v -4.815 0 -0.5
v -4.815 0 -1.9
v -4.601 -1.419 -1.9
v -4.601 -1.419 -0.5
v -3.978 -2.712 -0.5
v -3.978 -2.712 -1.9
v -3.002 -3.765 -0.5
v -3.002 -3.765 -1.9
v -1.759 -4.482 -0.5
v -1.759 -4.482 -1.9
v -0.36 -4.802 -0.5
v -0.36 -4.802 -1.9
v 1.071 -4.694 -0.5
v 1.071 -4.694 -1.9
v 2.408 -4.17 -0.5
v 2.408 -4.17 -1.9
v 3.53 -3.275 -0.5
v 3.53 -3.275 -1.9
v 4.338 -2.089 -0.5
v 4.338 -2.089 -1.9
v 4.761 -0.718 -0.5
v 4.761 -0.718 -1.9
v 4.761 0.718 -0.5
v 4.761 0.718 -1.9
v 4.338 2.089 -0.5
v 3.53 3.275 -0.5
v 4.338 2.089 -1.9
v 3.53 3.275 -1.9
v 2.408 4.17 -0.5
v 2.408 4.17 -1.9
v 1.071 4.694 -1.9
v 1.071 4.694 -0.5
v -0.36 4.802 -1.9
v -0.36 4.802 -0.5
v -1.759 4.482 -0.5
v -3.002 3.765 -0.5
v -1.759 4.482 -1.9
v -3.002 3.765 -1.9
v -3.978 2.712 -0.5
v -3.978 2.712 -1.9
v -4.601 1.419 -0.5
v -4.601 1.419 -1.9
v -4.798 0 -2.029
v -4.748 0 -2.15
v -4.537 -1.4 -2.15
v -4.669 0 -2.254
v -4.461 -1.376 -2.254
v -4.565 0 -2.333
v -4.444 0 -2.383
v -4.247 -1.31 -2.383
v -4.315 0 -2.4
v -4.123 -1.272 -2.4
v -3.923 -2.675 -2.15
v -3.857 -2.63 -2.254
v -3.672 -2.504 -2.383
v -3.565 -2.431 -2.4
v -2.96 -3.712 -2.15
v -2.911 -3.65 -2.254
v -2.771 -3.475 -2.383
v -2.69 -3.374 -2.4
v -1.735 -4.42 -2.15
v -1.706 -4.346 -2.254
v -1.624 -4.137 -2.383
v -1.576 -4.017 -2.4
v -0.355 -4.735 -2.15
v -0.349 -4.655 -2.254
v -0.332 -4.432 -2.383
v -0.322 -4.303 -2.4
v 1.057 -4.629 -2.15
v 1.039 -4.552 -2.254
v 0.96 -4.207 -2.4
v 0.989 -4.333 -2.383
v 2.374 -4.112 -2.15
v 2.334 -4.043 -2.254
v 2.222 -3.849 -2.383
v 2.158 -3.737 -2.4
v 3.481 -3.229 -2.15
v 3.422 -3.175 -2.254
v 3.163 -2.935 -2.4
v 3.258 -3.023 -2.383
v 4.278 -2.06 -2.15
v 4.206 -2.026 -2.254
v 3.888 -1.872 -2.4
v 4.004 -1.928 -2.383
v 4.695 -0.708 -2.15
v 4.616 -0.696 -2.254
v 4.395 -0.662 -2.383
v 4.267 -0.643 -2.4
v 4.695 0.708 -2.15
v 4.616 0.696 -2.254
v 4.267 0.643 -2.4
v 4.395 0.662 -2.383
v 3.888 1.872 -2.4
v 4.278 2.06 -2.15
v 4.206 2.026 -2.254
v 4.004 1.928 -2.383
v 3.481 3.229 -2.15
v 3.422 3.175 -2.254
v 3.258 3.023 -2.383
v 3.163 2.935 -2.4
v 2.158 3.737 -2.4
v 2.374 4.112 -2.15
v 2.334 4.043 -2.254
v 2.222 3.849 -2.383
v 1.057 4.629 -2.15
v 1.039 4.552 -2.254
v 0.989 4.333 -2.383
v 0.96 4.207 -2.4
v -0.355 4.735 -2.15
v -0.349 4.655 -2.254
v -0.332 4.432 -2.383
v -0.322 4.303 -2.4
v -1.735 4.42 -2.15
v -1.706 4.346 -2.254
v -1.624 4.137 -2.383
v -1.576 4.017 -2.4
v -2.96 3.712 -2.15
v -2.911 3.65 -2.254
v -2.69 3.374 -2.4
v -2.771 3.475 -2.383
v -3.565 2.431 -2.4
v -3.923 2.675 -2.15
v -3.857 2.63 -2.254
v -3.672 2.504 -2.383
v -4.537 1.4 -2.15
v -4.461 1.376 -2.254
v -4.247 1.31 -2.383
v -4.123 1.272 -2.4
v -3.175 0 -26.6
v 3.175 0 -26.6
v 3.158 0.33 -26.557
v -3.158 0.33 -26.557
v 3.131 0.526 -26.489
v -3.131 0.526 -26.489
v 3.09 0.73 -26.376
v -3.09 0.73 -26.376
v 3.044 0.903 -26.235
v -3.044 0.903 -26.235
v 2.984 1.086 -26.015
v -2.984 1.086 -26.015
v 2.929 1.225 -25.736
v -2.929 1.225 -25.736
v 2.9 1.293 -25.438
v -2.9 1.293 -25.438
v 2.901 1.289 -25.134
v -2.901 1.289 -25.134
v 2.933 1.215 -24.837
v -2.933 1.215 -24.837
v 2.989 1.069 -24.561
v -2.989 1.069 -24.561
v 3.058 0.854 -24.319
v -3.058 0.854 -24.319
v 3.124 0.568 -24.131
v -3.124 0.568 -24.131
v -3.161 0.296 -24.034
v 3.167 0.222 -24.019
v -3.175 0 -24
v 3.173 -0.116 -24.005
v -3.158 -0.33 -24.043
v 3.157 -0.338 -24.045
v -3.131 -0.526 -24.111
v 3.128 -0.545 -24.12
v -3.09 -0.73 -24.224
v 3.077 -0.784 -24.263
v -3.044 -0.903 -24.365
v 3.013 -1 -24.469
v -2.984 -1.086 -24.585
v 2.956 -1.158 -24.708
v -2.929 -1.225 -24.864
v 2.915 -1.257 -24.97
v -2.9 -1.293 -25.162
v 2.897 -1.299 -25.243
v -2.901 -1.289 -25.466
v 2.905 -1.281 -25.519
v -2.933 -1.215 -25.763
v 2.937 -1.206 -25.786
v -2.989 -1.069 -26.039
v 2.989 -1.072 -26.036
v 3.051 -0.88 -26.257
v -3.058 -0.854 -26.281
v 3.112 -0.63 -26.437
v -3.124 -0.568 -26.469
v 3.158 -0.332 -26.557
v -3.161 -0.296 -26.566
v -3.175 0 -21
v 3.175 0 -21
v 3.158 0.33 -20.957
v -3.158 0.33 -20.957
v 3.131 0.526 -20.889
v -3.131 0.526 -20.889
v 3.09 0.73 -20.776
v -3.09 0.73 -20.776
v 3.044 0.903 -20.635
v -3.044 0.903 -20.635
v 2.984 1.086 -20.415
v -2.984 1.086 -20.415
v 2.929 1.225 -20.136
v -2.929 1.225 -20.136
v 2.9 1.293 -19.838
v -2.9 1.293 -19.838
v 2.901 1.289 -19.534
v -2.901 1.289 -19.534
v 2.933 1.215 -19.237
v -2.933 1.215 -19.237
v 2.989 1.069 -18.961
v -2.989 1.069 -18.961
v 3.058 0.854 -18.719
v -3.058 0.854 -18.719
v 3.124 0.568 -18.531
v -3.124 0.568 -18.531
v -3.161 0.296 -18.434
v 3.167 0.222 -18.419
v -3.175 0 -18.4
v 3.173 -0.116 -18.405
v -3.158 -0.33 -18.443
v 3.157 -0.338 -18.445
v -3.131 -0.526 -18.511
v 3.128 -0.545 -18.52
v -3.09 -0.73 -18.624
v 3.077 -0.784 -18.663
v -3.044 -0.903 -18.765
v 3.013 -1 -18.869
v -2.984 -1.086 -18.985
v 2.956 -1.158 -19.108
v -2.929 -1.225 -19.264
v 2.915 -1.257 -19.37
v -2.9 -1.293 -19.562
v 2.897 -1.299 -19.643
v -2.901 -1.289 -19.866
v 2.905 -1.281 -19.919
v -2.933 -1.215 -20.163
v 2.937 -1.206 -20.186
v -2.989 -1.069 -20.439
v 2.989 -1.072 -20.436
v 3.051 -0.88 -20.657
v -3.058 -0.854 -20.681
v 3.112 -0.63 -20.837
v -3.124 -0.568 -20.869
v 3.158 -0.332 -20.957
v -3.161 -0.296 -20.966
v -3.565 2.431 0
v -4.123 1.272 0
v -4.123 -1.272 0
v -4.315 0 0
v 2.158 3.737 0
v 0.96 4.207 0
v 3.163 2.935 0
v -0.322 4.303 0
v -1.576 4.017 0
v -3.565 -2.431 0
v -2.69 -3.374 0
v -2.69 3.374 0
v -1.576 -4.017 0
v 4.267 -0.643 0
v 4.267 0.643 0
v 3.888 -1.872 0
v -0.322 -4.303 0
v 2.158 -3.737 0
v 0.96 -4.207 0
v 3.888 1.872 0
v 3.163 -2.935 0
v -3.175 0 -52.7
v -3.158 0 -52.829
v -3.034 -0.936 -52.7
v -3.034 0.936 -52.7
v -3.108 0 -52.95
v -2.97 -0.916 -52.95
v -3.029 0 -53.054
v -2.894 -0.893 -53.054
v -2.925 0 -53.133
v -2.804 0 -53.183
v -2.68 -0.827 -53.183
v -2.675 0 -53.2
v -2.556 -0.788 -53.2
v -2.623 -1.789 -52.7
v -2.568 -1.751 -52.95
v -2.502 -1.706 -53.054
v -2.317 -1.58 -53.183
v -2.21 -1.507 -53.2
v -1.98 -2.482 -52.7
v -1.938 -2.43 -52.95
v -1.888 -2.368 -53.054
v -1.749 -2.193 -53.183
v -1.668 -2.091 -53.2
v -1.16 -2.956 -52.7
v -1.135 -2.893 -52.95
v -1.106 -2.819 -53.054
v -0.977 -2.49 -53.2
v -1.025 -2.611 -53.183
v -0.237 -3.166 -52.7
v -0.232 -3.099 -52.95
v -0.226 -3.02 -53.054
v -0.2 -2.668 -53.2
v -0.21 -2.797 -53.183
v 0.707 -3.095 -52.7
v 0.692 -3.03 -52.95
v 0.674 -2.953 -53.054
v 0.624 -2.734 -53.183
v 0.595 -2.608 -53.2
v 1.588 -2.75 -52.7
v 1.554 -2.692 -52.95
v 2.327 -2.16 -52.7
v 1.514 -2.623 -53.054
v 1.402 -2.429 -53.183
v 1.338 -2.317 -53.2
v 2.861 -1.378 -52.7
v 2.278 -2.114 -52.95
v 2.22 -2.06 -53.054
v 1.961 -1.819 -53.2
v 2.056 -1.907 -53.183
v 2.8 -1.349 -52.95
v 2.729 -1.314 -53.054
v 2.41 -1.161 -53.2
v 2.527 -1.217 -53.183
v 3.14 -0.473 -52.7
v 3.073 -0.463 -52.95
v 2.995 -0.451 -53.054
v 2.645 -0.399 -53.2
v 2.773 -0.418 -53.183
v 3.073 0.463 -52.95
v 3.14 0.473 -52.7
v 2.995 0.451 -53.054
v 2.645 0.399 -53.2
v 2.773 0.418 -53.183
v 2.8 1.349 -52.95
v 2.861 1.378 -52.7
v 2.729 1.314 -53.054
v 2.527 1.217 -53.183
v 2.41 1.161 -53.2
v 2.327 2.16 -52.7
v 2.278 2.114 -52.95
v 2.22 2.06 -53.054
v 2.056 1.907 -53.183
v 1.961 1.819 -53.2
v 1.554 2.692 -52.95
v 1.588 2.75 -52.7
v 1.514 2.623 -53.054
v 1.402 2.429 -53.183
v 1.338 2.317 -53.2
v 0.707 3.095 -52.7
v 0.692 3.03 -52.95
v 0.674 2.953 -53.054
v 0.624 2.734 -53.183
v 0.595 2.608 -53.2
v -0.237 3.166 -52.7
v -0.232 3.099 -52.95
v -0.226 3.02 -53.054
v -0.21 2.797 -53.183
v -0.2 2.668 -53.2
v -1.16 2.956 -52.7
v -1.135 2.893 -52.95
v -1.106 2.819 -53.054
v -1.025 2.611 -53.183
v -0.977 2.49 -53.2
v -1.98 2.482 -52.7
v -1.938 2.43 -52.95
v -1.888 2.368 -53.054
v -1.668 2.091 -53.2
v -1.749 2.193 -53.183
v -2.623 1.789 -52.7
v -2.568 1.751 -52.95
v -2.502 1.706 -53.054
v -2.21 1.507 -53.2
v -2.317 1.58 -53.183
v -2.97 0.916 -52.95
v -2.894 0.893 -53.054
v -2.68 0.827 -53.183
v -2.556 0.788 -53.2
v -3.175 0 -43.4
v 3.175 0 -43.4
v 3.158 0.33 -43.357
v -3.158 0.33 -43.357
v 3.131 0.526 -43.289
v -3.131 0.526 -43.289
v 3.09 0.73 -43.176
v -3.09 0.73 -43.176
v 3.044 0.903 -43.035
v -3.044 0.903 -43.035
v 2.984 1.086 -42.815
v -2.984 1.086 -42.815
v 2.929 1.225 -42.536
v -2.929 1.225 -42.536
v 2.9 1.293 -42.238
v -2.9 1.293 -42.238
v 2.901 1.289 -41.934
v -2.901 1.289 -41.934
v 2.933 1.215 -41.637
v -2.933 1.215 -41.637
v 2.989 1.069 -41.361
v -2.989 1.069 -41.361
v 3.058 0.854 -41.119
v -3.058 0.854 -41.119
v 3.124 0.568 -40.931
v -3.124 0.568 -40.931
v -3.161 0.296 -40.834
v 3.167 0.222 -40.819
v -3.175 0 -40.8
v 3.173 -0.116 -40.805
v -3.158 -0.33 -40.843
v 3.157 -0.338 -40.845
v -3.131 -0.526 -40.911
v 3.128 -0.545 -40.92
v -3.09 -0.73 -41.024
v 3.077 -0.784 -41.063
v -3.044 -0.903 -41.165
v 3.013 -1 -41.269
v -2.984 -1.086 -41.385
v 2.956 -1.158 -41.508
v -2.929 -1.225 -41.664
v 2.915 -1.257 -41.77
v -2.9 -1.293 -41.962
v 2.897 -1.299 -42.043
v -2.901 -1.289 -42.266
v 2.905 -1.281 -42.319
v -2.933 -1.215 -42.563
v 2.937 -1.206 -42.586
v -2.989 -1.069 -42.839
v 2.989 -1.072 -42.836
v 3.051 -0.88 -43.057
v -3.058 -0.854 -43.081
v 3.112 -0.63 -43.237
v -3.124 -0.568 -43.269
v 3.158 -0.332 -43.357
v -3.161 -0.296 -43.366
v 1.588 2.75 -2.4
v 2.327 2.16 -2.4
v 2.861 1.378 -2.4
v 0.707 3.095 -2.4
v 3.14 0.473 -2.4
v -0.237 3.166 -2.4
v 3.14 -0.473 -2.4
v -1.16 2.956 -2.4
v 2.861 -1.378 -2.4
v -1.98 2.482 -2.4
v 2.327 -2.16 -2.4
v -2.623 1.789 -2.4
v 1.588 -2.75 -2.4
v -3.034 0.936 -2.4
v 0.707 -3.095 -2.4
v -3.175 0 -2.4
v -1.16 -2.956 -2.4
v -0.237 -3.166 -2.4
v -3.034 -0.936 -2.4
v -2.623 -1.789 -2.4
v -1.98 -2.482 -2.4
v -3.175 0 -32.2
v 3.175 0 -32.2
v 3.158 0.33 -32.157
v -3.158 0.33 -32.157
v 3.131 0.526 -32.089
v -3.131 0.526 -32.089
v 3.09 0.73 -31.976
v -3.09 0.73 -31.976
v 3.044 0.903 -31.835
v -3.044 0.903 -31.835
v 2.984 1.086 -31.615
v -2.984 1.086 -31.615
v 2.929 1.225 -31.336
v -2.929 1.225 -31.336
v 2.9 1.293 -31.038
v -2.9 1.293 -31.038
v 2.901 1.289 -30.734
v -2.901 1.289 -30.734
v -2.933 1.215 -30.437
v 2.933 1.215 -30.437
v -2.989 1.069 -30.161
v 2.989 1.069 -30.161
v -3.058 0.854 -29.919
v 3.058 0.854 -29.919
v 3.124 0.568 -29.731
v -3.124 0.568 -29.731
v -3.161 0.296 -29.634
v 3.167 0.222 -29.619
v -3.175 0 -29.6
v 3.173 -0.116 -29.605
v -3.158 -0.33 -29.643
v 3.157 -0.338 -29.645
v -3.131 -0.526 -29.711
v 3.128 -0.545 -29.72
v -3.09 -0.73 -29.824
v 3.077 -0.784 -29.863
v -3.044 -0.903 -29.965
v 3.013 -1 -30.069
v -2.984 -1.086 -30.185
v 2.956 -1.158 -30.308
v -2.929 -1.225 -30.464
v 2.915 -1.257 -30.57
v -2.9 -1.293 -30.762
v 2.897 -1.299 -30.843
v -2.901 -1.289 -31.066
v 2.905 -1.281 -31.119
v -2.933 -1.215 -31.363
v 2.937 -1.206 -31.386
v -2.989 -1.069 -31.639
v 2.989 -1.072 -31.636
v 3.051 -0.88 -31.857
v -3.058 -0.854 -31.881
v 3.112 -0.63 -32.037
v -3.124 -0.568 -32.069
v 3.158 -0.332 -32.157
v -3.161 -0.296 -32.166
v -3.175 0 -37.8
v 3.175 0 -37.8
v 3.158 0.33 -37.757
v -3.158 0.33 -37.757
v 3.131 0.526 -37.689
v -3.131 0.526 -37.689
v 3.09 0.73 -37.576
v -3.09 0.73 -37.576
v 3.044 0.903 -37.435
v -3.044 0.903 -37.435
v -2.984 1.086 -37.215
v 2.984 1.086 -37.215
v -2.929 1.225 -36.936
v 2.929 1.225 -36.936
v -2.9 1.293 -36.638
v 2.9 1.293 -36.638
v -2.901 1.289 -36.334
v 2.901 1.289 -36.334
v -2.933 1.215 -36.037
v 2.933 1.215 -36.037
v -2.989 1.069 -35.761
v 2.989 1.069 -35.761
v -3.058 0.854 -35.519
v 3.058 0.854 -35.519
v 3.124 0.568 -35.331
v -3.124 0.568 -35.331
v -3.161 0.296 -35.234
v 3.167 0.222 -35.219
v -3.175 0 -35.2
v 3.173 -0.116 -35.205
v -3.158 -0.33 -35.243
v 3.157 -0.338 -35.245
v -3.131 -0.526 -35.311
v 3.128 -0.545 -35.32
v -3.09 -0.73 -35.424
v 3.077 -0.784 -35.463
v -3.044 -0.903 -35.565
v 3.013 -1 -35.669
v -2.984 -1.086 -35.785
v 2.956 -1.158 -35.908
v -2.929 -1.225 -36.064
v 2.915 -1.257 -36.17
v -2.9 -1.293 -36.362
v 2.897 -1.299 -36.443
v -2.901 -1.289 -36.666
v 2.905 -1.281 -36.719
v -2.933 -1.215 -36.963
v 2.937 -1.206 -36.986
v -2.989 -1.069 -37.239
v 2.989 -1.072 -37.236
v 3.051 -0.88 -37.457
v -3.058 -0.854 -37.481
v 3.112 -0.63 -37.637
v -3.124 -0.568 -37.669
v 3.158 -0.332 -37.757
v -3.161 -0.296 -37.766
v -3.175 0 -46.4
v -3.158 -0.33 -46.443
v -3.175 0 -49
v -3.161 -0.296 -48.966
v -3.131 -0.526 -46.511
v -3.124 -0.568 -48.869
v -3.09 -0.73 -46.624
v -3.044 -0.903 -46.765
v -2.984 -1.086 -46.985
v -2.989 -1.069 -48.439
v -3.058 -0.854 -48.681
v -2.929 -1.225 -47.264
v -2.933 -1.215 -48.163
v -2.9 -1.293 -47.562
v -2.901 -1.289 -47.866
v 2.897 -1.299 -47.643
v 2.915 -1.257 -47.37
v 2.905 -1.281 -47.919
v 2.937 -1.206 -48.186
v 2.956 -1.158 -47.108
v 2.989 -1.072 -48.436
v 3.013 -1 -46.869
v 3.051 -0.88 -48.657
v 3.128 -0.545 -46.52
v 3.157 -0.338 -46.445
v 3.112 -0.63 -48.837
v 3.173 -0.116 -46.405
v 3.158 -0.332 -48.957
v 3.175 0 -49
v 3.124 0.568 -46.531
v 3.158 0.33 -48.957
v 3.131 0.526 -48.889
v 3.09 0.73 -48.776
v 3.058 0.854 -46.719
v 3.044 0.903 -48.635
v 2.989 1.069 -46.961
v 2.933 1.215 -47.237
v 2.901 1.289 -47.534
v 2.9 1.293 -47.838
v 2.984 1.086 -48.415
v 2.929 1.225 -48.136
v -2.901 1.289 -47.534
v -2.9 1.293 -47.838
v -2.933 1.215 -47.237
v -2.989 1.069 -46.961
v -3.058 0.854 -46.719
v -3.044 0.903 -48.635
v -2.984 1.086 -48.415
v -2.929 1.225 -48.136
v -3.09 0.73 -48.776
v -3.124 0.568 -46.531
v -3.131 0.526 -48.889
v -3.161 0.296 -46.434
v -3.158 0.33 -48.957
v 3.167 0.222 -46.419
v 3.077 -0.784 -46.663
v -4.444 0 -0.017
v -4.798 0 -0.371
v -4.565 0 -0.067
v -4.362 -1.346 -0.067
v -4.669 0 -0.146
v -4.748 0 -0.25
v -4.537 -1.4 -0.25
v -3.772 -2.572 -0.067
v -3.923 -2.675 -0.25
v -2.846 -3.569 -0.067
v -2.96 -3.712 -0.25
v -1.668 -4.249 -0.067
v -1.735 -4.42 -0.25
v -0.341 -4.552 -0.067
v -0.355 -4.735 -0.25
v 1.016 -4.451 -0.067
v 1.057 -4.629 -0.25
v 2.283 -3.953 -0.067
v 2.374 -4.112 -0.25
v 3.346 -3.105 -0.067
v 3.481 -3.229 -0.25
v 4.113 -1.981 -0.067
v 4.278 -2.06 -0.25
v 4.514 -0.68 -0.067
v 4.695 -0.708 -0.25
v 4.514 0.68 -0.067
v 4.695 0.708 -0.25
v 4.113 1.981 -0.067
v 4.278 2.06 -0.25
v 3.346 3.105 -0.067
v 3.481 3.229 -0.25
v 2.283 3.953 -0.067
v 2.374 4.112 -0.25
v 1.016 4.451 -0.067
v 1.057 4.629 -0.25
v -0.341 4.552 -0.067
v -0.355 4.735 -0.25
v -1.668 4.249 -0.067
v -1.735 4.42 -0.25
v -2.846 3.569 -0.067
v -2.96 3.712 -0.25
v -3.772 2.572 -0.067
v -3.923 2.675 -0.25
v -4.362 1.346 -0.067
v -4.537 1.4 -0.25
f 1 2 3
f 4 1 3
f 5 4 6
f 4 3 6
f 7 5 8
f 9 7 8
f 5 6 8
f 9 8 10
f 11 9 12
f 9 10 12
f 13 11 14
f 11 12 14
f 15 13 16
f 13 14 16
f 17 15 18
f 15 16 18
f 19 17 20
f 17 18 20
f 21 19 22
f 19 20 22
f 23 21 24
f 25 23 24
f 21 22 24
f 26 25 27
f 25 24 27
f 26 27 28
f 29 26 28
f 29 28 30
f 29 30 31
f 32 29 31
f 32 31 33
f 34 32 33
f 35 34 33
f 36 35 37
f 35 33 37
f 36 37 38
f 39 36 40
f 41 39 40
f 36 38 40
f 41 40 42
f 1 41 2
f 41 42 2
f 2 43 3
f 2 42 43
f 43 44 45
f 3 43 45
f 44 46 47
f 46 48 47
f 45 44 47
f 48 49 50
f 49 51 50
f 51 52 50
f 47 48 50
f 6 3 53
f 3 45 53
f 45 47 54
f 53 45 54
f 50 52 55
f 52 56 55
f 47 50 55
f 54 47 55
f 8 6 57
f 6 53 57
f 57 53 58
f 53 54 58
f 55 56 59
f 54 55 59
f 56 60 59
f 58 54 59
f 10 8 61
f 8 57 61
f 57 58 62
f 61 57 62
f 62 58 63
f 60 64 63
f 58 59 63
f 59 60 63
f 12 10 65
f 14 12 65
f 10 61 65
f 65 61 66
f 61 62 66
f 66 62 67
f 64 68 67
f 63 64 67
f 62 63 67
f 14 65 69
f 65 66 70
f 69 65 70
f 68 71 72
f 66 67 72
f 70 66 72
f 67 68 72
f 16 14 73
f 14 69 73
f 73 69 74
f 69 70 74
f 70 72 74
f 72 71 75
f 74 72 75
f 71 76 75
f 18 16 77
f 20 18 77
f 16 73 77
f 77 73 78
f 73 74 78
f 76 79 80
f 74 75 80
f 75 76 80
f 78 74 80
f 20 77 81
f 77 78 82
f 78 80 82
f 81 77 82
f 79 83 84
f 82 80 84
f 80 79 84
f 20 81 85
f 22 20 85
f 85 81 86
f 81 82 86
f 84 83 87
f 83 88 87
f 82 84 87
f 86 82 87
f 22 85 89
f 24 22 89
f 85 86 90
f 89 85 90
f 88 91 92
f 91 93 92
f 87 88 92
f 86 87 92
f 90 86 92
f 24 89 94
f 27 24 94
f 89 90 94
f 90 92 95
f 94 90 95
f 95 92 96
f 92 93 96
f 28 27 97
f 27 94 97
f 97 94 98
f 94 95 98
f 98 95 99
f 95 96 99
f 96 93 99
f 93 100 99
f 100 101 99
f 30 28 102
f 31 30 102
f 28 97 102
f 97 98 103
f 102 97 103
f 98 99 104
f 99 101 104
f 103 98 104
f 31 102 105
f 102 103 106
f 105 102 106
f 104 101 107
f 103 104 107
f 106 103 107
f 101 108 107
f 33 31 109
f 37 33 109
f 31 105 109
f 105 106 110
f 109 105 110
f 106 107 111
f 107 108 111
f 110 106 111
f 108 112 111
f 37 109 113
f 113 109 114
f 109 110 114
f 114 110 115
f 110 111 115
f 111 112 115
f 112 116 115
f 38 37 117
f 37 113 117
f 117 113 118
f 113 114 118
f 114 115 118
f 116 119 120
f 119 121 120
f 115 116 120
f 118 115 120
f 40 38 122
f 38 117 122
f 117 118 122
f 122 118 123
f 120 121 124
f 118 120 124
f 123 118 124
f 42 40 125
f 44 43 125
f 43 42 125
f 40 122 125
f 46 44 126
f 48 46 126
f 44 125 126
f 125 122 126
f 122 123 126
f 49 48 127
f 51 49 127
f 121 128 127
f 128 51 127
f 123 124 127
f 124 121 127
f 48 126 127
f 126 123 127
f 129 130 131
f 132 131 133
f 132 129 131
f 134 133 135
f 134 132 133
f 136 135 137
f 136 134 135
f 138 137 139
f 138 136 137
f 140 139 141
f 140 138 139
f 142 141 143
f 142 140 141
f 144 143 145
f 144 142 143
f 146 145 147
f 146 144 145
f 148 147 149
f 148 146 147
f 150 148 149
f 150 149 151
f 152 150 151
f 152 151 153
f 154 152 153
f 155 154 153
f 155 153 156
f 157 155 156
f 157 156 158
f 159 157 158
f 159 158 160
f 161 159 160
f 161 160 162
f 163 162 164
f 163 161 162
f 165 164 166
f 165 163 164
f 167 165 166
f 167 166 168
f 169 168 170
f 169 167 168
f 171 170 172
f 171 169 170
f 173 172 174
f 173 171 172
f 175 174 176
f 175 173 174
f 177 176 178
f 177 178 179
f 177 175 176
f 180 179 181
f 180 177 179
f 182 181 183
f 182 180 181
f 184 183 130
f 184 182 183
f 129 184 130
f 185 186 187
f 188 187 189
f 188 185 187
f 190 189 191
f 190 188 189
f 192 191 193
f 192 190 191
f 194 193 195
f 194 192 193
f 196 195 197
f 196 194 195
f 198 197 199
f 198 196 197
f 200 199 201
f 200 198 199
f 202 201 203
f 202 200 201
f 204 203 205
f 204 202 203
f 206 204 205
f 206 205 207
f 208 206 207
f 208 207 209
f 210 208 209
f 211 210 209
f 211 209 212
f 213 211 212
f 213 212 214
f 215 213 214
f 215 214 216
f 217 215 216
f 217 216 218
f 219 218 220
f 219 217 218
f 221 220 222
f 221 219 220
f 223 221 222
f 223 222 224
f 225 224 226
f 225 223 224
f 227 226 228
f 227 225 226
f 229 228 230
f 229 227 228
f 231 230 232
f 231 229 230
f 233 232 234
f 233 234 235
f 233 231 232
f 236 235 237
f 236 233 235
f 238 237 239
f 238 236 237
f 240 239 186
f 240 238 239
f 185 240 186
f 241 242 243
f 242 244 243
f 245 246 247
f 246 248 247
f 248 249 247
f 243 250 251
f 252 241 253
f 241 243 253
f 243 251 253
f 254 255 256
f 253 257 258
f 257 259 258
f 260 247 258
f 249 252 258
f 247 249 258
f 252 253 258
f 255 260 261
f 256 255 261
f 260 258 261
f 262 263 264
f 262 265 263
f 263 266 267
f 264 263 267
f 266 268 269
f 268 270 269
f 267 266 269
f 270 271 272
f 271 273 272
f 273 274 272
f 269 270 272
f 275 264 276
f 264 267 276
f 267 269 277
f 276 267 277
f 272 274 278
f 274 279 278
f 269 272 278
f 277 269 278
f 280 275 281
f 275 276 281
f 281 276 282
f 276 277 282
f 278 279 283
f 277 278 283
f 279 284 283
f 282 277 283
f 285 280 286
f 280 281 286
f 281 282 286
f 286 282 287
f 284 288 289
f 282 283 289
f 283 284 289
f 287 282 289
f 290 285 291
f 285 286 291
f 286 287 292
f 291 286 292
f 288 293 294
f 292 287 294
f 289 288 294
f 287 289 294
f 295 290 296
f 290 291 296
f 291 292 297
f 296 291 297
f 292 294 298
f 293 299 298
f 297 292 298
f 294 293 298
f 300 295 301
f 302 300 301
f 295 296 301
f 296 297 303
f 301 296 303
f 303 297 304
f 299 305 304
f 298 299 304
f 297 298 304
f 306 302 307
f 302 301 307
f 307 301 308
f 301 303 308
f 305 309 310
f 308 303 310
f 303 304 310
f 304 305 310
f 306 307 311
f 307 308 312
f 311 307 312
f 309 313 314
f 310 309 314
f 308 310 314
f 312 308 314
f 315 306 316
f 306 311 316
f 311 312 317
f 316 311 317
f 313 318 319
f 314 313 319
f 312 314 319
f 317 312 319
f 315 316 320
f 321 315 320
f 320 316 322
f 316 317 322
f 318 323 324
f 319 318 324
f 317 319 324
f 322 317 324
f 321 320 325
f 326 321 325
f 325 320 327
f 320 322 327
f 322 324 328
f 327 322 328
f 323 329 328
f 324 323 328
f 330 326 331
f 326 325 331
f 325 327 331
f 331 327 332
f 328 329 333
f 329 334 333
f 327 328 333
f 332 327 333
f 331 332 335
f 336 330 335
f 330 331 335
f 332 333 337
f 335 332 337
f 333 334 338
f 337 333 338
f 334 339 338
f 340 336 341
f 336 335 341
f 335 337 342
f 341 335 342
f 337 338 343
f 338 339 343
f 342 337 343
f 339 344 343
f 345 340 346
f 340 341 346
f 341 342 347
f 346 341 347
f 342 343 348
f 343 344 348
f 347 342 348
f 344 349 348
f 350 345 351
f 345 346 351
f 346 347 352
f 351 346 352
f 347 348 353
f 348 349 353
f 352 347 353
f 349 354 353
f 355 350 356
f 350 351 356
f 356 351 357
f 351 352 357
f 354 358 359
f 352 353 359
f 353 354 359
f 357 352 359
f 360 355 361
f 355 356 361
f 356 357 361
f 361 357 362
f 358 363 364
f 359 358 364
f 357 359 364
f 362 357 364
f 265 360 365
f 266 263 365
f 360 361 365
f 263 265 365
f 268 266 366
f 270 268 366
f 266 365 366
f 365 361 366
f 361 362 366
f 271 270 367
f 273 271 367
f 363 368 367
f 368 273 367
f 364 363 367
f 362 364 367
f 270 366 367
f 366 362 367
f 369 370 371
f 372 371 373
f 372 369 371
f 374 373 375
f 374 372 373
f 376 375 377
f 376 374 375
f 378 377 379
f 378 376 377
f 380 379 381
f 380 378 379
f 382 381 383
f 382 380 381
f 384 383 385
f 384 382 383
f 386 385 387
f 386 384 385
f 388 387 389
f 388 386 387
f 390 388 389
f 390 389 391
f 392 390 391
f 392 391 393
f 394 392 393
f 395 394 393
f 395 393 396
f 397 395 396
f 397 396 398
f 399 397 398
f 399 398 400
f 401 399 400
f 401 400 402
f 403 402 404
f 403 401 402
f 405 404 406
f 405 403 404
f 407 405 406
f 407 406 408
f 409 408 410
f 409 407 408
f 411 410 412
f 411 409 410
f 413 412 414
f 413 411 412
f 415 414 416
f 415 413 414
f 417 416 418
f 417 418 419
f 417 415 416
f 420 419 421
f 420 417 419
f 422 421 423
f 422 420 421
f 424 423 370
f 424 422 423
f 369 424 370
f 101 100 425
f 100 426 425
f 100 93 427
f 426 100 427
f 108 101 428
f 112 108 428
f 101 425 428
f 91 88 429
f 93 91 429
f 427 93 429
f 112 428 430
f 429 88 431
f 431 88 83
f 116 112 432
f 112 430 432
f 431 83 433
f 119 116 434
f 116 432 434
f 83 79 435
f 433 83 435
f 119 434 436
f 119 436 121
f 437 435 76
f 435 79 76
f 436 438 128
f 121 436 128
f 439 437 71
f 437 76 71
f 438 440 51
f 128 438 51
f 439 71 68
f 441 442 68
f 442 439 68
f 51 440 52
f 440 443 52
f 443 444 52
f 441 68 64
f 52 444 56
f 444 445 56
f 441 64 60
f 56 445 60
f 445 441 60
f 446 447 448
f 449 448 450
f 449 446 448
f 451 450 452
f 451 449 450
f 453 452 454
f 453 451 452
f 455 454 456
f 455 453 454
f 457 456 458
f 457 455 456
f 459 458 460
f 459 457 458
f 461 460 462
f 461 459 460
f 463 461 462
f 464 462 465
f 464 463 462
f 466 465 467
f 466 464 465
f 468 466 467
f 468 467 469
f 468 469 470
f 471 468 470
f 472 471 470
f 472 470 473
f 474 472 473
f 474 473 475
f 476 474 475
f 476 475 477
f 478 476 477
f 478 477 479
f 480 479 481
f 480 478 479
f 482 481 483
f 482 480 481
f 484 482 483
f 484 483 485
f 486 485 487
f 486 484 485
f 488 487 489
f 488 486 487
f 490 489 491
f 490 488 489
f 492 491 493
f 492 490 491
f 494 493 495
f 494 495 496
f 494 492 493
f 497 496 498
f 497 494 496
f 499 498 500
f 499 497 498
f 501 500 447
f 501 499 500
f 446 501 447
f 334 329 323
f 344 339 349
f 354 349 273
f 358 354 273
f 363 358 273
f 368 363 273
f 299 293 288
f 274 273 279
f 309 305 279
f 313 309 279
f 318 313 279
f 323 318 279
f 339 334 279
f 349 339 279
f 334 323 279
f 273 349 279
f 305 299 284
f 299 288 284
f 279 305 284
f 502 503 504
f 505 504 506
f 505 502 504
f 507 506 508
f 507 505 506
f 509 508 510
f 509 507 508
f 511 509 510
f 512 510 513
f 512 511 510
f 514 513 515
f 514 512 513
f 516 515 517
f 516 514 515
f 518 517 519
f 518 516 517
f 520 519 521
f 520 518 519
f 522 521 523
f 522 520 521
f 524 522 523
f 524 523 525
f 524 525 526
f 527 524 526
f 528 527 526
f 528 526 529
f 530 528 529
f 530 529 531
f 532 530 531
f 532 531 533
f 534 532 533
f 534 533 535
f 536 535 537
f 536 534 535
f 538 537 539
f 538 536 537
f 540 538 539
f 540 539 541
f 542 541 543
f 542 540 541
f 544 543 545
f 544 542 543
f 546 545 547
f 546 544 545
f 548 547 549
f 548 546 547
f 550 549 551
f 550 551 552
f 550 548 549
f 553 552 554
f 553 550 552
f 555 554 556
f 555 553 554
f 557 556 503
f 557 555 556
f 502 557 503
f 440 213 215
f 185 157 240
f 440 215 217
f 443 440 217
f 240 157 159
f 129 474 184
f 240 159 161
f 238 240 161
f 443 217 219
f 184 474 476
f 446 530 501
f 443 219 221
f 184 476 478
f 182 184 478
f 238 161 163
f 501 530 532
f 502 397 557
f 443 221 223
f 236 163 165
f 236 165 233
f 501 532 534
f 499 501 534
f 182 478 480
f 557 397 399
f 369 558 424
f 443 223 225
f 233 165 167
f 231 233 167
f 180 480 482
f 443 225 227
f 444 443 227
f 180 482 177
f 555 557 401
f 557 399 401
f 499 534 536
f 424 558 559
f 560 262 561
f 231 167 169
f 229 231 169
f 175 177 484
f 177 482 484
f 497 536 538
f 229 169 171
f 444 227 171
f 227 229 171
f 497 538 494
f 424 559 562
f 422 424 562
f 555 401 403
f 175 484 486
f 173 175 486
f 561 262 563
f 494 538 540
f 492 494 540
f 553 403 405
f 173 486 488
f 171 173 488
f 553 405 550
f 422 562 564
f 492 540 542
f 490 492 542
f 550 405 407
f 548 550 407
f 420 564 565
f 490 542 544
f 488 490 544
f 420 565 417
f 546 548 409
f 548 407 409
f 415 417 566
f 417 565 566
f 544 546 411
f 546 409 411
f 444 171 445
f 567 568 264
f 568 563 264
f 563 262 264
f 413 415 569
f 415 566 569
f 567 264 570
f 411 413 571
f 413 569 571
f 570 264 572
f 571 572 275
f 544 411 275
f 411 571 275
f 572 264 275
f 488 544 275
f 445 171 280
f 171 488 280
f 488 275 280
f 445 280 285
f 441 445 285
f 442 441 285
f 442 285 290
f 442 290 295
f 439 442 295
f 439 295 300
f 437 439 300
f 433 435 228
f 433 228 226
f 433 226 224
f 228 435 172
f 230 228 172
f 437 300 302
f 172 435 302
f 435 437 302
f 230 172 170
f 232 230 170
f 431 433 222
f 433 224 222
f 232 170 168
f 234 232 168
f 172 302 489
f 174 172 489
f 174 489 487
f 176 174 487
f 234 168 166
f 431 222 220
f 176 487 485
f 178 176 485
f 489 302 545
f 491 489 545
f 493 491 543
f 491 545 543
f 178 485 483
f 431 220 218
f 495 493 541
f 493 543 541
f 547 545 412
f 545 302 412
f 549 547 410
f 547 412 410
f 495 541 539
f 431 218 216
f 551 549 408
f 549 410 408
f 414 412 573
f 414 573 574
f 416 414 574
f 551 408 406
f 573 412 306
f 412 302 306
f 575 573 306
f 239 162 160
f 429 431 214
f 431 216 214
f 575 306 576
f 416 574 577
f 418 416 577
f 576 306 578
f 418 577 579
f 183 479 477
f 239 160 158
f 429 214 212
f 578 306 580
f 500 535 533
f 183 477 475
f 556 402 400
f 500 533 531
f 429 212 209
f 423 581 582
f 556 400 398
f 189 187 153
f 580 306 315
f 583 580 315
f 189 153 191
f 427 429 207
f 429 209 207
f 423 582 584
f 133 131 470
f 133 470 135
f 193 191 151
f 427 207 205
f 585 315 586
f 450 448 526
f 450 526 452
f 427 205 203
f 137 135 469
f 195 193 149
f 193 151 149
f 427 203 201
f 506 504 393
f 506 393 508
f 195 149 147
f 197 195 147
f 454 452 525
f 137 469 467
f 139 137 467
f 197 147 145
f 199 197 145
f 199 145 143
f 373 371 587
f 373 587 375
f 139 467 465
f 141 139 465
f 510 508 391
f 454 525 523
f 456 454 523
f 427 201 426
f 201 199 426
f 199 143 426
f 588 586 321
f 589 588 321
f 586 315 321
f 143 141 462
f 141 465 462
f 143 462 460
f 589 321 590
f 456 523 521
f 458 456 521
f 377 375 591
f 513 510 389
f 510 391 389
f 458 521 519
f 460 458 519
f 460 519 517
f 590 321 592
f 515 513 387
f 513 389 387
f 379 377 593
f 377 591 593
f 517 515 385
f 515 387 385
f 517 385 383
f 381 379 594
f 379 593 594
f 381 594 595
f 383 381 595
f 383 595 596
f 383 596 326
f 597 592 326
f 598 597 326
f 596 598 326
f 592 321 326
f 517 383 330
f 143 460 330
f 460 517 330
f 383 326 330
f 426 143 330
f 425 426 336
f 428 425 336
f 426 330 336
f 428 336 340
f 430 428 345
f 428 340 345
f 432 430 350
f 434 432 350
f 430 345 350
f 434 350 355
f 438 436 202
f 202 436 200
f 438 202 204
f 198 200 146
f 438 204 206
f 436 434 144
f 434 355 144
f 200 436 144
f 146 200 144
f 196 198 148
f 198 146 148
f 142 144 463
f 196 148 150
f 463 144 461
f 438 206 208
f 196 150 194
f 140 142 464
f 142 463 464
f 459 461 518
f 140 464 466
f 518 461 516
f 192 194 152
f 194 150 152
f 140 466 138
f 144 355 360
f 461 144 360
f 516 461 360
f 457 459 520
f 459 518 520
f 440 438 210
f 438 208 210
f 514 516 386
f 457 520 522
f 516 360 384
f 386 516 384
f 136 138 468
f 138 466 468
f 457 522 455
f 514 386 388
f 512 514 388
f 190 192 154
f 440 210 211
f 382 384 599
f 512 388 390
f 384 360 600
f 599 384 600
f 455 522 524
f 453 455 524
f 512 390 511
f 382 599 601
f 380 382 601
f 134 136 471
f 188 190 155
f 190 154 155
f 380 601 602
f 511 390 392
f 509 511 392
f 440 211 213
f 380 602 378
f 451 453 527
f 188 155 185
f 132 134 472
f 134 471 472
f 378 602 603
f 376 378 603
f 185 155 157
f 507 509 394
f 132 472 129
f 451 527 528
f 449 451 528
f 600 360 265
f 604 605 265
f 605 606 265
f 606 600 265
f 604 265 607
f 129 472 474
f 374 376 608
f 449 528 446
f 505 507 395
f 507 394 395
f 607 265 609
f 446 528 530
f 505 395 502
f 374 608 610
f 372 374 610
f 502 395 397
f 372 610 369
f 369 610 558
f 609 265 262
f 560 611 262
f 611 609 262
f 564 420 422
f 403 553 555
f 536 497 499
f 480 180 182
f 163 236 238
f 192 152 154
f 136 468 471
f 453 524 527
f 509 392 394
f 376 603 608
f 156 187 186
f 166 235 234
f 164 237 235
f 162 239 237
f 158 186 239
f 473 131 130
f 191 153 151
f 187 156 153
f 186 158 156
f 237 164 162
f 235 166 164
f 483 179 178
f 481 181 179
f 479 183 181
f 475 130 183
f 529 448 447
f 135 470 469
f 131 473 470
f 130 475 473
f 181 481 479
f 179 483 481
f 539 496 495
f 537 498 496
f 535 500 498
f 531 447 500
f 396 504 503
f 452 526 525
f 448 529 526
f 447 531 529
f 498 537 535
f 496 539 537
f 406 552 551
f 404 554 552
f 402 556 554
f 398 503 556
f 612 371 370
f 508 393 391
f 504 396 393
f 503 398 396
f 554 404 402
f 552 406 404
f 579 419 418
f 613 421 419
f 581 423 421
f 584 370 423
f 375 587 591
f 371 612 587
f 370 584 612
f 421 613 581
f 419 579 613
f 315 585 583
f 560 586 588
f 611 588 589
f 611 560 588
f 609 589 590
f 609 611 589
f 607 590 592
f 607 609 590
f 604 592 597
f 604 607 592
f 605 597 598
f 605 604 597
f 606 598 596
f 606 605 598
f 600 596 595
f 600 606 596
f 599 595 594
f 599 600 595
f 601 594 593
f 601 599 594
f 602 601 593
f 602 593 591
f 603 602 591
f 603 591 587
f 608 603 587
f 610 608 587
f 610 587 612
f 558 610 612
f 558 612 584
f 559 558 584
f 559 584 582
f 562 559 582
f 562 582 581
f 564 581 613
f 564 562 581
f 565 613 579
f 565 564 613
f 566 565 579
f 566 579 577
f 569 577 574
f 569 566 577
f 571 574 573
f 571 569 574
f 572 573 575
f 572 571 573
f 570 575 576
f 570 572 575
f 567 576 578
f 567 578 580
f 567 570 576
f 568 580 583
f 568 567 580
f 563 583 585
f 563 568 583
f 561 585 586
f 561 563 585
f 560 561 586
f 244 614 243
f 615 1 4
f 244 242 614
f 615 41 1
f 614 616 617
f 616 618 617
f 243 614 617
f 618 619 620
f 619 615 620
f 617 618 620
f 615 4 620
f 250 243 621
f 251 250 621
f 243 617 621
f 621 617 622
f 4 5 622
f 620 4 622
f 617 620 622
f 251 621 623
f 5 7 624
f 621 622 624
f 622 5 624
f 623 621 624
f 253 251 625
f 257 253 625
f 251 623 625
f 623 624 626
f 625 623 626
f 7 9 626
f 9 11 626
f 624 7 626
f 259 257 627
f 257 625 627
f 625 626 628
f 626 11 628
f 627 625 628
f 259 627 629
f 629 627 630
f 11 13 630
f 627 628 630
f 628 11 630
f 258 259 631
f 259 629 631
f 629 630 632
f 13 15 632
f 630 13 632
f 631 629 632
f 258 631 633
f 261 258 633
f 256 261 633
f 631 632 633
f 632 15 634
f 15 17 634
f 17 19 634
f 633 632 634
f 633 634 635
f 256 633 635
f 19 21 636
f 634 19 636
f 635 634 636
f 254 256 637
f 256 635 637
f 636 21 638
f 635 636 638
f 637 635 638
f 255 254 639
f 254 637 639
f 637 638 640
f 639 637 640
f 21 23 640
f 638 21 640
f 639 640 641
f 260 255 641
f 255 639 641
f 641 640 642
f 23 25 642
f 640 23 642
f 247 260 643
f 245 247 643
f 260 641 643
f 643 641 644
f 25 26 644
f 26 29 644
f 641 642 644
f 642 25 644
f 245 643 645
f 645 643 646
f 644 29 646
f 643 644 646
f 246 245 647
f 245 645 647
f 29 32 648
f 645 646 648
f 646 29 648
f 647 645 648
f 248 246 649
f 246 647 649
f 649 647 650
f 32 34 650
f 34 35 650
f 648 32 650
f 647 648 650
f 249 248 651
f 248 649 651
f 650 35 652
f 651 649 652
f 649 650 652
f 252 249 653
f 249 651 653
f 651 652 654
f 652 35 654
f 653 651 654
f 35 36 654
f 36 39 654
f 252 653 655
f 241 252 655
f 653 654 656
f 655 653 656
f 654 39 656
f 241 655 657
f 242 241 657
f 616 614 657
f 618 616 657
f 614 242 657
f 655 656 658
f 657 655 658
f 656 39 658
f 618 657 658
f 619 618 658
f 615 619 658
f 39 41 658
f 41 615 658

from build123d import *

# Parameters (mm, degrees)
CUT_EXTRUDE1_DEPTH      = 54.63402325
CUT_EXTRUDE1_DEPTH_BACK = 54.63402325
SKETCH2_R               = 1.3
F7F_R                   = 0.5
FILLET2_R               = 0.5


with BuildPart() as part:
    # Sketch1 → Revolve1 (revolve)
    with BuildSketch(Plane.YZ, mode=Mode.PRIVATE) as revolve1_sk:
        Polygon((0, 0), (4.815, 0), (4.815, -2.4), (3.175, -2.4), (3.175, -53.2), (0, -53.2), align=None)
    revolve(revolve1_sk.sketch.rotate(Axis((0, 0, -335.576810525), (0, 0, 1)), 90), axis=Axis((0, 0, -335.576810525), (0, 0, 1)))

    # Sketch2 → Cut-Extrude1 (cut, two sides: drawn at the far end of the back side and taken through both)
    with BuildSketch(Plane.YZ.offset(-CUT_EXTRUDE1_DEPTH_BACK)):
        with Locations(Location((0, -47.7, 0), (0, 0, 270.000000002))):
            Circle(SKETCH2_R)
        with Locations(Location((0, -42.1, 0), (0, 0, 270.000000002))):
            Circle(SKETCH2_R)
        with Locations(Location((0, -25.3, 0), (0, 0, 270.000000002))):
            Circle(SKETCH2_R)
        with Locations(Location((0, -30.9, 0), (0, 0, 270.000000002))):
            Circle(SKETCH2_R)
        with Locations(Location((0, -36.5, 0), (0, 0, 270.000000002))):
            Circle(SKETCH2_R)
        with Locations(Location((0, -19.7, 0), (0, 0, 270.000000002))):
            Circle(SKETCH2_R)
    extrude(amount=CUT_EXTRUDE1_DEPTH + CUT_EXTRUDE1_DEPTH_BACK, mode=Mode.SUBTRACT)

    # f7f
    f7f_edges = [part.edges().sort_by_distance(p)[0] for p in [
        (4.815, 0, -2.4),
        (4.815, 0, 0),
    ]]
    fillet(f7f_edges, radius=F7F_R)

    # Fillet2
    fillet2_edges = [part.edges().sort_by_distance(p)[0] for p in [
        (3.175, 0, -53.2),
    ]]
    fillet(fillet2_edges, radius=FILLET2_R)


solid = part.part
